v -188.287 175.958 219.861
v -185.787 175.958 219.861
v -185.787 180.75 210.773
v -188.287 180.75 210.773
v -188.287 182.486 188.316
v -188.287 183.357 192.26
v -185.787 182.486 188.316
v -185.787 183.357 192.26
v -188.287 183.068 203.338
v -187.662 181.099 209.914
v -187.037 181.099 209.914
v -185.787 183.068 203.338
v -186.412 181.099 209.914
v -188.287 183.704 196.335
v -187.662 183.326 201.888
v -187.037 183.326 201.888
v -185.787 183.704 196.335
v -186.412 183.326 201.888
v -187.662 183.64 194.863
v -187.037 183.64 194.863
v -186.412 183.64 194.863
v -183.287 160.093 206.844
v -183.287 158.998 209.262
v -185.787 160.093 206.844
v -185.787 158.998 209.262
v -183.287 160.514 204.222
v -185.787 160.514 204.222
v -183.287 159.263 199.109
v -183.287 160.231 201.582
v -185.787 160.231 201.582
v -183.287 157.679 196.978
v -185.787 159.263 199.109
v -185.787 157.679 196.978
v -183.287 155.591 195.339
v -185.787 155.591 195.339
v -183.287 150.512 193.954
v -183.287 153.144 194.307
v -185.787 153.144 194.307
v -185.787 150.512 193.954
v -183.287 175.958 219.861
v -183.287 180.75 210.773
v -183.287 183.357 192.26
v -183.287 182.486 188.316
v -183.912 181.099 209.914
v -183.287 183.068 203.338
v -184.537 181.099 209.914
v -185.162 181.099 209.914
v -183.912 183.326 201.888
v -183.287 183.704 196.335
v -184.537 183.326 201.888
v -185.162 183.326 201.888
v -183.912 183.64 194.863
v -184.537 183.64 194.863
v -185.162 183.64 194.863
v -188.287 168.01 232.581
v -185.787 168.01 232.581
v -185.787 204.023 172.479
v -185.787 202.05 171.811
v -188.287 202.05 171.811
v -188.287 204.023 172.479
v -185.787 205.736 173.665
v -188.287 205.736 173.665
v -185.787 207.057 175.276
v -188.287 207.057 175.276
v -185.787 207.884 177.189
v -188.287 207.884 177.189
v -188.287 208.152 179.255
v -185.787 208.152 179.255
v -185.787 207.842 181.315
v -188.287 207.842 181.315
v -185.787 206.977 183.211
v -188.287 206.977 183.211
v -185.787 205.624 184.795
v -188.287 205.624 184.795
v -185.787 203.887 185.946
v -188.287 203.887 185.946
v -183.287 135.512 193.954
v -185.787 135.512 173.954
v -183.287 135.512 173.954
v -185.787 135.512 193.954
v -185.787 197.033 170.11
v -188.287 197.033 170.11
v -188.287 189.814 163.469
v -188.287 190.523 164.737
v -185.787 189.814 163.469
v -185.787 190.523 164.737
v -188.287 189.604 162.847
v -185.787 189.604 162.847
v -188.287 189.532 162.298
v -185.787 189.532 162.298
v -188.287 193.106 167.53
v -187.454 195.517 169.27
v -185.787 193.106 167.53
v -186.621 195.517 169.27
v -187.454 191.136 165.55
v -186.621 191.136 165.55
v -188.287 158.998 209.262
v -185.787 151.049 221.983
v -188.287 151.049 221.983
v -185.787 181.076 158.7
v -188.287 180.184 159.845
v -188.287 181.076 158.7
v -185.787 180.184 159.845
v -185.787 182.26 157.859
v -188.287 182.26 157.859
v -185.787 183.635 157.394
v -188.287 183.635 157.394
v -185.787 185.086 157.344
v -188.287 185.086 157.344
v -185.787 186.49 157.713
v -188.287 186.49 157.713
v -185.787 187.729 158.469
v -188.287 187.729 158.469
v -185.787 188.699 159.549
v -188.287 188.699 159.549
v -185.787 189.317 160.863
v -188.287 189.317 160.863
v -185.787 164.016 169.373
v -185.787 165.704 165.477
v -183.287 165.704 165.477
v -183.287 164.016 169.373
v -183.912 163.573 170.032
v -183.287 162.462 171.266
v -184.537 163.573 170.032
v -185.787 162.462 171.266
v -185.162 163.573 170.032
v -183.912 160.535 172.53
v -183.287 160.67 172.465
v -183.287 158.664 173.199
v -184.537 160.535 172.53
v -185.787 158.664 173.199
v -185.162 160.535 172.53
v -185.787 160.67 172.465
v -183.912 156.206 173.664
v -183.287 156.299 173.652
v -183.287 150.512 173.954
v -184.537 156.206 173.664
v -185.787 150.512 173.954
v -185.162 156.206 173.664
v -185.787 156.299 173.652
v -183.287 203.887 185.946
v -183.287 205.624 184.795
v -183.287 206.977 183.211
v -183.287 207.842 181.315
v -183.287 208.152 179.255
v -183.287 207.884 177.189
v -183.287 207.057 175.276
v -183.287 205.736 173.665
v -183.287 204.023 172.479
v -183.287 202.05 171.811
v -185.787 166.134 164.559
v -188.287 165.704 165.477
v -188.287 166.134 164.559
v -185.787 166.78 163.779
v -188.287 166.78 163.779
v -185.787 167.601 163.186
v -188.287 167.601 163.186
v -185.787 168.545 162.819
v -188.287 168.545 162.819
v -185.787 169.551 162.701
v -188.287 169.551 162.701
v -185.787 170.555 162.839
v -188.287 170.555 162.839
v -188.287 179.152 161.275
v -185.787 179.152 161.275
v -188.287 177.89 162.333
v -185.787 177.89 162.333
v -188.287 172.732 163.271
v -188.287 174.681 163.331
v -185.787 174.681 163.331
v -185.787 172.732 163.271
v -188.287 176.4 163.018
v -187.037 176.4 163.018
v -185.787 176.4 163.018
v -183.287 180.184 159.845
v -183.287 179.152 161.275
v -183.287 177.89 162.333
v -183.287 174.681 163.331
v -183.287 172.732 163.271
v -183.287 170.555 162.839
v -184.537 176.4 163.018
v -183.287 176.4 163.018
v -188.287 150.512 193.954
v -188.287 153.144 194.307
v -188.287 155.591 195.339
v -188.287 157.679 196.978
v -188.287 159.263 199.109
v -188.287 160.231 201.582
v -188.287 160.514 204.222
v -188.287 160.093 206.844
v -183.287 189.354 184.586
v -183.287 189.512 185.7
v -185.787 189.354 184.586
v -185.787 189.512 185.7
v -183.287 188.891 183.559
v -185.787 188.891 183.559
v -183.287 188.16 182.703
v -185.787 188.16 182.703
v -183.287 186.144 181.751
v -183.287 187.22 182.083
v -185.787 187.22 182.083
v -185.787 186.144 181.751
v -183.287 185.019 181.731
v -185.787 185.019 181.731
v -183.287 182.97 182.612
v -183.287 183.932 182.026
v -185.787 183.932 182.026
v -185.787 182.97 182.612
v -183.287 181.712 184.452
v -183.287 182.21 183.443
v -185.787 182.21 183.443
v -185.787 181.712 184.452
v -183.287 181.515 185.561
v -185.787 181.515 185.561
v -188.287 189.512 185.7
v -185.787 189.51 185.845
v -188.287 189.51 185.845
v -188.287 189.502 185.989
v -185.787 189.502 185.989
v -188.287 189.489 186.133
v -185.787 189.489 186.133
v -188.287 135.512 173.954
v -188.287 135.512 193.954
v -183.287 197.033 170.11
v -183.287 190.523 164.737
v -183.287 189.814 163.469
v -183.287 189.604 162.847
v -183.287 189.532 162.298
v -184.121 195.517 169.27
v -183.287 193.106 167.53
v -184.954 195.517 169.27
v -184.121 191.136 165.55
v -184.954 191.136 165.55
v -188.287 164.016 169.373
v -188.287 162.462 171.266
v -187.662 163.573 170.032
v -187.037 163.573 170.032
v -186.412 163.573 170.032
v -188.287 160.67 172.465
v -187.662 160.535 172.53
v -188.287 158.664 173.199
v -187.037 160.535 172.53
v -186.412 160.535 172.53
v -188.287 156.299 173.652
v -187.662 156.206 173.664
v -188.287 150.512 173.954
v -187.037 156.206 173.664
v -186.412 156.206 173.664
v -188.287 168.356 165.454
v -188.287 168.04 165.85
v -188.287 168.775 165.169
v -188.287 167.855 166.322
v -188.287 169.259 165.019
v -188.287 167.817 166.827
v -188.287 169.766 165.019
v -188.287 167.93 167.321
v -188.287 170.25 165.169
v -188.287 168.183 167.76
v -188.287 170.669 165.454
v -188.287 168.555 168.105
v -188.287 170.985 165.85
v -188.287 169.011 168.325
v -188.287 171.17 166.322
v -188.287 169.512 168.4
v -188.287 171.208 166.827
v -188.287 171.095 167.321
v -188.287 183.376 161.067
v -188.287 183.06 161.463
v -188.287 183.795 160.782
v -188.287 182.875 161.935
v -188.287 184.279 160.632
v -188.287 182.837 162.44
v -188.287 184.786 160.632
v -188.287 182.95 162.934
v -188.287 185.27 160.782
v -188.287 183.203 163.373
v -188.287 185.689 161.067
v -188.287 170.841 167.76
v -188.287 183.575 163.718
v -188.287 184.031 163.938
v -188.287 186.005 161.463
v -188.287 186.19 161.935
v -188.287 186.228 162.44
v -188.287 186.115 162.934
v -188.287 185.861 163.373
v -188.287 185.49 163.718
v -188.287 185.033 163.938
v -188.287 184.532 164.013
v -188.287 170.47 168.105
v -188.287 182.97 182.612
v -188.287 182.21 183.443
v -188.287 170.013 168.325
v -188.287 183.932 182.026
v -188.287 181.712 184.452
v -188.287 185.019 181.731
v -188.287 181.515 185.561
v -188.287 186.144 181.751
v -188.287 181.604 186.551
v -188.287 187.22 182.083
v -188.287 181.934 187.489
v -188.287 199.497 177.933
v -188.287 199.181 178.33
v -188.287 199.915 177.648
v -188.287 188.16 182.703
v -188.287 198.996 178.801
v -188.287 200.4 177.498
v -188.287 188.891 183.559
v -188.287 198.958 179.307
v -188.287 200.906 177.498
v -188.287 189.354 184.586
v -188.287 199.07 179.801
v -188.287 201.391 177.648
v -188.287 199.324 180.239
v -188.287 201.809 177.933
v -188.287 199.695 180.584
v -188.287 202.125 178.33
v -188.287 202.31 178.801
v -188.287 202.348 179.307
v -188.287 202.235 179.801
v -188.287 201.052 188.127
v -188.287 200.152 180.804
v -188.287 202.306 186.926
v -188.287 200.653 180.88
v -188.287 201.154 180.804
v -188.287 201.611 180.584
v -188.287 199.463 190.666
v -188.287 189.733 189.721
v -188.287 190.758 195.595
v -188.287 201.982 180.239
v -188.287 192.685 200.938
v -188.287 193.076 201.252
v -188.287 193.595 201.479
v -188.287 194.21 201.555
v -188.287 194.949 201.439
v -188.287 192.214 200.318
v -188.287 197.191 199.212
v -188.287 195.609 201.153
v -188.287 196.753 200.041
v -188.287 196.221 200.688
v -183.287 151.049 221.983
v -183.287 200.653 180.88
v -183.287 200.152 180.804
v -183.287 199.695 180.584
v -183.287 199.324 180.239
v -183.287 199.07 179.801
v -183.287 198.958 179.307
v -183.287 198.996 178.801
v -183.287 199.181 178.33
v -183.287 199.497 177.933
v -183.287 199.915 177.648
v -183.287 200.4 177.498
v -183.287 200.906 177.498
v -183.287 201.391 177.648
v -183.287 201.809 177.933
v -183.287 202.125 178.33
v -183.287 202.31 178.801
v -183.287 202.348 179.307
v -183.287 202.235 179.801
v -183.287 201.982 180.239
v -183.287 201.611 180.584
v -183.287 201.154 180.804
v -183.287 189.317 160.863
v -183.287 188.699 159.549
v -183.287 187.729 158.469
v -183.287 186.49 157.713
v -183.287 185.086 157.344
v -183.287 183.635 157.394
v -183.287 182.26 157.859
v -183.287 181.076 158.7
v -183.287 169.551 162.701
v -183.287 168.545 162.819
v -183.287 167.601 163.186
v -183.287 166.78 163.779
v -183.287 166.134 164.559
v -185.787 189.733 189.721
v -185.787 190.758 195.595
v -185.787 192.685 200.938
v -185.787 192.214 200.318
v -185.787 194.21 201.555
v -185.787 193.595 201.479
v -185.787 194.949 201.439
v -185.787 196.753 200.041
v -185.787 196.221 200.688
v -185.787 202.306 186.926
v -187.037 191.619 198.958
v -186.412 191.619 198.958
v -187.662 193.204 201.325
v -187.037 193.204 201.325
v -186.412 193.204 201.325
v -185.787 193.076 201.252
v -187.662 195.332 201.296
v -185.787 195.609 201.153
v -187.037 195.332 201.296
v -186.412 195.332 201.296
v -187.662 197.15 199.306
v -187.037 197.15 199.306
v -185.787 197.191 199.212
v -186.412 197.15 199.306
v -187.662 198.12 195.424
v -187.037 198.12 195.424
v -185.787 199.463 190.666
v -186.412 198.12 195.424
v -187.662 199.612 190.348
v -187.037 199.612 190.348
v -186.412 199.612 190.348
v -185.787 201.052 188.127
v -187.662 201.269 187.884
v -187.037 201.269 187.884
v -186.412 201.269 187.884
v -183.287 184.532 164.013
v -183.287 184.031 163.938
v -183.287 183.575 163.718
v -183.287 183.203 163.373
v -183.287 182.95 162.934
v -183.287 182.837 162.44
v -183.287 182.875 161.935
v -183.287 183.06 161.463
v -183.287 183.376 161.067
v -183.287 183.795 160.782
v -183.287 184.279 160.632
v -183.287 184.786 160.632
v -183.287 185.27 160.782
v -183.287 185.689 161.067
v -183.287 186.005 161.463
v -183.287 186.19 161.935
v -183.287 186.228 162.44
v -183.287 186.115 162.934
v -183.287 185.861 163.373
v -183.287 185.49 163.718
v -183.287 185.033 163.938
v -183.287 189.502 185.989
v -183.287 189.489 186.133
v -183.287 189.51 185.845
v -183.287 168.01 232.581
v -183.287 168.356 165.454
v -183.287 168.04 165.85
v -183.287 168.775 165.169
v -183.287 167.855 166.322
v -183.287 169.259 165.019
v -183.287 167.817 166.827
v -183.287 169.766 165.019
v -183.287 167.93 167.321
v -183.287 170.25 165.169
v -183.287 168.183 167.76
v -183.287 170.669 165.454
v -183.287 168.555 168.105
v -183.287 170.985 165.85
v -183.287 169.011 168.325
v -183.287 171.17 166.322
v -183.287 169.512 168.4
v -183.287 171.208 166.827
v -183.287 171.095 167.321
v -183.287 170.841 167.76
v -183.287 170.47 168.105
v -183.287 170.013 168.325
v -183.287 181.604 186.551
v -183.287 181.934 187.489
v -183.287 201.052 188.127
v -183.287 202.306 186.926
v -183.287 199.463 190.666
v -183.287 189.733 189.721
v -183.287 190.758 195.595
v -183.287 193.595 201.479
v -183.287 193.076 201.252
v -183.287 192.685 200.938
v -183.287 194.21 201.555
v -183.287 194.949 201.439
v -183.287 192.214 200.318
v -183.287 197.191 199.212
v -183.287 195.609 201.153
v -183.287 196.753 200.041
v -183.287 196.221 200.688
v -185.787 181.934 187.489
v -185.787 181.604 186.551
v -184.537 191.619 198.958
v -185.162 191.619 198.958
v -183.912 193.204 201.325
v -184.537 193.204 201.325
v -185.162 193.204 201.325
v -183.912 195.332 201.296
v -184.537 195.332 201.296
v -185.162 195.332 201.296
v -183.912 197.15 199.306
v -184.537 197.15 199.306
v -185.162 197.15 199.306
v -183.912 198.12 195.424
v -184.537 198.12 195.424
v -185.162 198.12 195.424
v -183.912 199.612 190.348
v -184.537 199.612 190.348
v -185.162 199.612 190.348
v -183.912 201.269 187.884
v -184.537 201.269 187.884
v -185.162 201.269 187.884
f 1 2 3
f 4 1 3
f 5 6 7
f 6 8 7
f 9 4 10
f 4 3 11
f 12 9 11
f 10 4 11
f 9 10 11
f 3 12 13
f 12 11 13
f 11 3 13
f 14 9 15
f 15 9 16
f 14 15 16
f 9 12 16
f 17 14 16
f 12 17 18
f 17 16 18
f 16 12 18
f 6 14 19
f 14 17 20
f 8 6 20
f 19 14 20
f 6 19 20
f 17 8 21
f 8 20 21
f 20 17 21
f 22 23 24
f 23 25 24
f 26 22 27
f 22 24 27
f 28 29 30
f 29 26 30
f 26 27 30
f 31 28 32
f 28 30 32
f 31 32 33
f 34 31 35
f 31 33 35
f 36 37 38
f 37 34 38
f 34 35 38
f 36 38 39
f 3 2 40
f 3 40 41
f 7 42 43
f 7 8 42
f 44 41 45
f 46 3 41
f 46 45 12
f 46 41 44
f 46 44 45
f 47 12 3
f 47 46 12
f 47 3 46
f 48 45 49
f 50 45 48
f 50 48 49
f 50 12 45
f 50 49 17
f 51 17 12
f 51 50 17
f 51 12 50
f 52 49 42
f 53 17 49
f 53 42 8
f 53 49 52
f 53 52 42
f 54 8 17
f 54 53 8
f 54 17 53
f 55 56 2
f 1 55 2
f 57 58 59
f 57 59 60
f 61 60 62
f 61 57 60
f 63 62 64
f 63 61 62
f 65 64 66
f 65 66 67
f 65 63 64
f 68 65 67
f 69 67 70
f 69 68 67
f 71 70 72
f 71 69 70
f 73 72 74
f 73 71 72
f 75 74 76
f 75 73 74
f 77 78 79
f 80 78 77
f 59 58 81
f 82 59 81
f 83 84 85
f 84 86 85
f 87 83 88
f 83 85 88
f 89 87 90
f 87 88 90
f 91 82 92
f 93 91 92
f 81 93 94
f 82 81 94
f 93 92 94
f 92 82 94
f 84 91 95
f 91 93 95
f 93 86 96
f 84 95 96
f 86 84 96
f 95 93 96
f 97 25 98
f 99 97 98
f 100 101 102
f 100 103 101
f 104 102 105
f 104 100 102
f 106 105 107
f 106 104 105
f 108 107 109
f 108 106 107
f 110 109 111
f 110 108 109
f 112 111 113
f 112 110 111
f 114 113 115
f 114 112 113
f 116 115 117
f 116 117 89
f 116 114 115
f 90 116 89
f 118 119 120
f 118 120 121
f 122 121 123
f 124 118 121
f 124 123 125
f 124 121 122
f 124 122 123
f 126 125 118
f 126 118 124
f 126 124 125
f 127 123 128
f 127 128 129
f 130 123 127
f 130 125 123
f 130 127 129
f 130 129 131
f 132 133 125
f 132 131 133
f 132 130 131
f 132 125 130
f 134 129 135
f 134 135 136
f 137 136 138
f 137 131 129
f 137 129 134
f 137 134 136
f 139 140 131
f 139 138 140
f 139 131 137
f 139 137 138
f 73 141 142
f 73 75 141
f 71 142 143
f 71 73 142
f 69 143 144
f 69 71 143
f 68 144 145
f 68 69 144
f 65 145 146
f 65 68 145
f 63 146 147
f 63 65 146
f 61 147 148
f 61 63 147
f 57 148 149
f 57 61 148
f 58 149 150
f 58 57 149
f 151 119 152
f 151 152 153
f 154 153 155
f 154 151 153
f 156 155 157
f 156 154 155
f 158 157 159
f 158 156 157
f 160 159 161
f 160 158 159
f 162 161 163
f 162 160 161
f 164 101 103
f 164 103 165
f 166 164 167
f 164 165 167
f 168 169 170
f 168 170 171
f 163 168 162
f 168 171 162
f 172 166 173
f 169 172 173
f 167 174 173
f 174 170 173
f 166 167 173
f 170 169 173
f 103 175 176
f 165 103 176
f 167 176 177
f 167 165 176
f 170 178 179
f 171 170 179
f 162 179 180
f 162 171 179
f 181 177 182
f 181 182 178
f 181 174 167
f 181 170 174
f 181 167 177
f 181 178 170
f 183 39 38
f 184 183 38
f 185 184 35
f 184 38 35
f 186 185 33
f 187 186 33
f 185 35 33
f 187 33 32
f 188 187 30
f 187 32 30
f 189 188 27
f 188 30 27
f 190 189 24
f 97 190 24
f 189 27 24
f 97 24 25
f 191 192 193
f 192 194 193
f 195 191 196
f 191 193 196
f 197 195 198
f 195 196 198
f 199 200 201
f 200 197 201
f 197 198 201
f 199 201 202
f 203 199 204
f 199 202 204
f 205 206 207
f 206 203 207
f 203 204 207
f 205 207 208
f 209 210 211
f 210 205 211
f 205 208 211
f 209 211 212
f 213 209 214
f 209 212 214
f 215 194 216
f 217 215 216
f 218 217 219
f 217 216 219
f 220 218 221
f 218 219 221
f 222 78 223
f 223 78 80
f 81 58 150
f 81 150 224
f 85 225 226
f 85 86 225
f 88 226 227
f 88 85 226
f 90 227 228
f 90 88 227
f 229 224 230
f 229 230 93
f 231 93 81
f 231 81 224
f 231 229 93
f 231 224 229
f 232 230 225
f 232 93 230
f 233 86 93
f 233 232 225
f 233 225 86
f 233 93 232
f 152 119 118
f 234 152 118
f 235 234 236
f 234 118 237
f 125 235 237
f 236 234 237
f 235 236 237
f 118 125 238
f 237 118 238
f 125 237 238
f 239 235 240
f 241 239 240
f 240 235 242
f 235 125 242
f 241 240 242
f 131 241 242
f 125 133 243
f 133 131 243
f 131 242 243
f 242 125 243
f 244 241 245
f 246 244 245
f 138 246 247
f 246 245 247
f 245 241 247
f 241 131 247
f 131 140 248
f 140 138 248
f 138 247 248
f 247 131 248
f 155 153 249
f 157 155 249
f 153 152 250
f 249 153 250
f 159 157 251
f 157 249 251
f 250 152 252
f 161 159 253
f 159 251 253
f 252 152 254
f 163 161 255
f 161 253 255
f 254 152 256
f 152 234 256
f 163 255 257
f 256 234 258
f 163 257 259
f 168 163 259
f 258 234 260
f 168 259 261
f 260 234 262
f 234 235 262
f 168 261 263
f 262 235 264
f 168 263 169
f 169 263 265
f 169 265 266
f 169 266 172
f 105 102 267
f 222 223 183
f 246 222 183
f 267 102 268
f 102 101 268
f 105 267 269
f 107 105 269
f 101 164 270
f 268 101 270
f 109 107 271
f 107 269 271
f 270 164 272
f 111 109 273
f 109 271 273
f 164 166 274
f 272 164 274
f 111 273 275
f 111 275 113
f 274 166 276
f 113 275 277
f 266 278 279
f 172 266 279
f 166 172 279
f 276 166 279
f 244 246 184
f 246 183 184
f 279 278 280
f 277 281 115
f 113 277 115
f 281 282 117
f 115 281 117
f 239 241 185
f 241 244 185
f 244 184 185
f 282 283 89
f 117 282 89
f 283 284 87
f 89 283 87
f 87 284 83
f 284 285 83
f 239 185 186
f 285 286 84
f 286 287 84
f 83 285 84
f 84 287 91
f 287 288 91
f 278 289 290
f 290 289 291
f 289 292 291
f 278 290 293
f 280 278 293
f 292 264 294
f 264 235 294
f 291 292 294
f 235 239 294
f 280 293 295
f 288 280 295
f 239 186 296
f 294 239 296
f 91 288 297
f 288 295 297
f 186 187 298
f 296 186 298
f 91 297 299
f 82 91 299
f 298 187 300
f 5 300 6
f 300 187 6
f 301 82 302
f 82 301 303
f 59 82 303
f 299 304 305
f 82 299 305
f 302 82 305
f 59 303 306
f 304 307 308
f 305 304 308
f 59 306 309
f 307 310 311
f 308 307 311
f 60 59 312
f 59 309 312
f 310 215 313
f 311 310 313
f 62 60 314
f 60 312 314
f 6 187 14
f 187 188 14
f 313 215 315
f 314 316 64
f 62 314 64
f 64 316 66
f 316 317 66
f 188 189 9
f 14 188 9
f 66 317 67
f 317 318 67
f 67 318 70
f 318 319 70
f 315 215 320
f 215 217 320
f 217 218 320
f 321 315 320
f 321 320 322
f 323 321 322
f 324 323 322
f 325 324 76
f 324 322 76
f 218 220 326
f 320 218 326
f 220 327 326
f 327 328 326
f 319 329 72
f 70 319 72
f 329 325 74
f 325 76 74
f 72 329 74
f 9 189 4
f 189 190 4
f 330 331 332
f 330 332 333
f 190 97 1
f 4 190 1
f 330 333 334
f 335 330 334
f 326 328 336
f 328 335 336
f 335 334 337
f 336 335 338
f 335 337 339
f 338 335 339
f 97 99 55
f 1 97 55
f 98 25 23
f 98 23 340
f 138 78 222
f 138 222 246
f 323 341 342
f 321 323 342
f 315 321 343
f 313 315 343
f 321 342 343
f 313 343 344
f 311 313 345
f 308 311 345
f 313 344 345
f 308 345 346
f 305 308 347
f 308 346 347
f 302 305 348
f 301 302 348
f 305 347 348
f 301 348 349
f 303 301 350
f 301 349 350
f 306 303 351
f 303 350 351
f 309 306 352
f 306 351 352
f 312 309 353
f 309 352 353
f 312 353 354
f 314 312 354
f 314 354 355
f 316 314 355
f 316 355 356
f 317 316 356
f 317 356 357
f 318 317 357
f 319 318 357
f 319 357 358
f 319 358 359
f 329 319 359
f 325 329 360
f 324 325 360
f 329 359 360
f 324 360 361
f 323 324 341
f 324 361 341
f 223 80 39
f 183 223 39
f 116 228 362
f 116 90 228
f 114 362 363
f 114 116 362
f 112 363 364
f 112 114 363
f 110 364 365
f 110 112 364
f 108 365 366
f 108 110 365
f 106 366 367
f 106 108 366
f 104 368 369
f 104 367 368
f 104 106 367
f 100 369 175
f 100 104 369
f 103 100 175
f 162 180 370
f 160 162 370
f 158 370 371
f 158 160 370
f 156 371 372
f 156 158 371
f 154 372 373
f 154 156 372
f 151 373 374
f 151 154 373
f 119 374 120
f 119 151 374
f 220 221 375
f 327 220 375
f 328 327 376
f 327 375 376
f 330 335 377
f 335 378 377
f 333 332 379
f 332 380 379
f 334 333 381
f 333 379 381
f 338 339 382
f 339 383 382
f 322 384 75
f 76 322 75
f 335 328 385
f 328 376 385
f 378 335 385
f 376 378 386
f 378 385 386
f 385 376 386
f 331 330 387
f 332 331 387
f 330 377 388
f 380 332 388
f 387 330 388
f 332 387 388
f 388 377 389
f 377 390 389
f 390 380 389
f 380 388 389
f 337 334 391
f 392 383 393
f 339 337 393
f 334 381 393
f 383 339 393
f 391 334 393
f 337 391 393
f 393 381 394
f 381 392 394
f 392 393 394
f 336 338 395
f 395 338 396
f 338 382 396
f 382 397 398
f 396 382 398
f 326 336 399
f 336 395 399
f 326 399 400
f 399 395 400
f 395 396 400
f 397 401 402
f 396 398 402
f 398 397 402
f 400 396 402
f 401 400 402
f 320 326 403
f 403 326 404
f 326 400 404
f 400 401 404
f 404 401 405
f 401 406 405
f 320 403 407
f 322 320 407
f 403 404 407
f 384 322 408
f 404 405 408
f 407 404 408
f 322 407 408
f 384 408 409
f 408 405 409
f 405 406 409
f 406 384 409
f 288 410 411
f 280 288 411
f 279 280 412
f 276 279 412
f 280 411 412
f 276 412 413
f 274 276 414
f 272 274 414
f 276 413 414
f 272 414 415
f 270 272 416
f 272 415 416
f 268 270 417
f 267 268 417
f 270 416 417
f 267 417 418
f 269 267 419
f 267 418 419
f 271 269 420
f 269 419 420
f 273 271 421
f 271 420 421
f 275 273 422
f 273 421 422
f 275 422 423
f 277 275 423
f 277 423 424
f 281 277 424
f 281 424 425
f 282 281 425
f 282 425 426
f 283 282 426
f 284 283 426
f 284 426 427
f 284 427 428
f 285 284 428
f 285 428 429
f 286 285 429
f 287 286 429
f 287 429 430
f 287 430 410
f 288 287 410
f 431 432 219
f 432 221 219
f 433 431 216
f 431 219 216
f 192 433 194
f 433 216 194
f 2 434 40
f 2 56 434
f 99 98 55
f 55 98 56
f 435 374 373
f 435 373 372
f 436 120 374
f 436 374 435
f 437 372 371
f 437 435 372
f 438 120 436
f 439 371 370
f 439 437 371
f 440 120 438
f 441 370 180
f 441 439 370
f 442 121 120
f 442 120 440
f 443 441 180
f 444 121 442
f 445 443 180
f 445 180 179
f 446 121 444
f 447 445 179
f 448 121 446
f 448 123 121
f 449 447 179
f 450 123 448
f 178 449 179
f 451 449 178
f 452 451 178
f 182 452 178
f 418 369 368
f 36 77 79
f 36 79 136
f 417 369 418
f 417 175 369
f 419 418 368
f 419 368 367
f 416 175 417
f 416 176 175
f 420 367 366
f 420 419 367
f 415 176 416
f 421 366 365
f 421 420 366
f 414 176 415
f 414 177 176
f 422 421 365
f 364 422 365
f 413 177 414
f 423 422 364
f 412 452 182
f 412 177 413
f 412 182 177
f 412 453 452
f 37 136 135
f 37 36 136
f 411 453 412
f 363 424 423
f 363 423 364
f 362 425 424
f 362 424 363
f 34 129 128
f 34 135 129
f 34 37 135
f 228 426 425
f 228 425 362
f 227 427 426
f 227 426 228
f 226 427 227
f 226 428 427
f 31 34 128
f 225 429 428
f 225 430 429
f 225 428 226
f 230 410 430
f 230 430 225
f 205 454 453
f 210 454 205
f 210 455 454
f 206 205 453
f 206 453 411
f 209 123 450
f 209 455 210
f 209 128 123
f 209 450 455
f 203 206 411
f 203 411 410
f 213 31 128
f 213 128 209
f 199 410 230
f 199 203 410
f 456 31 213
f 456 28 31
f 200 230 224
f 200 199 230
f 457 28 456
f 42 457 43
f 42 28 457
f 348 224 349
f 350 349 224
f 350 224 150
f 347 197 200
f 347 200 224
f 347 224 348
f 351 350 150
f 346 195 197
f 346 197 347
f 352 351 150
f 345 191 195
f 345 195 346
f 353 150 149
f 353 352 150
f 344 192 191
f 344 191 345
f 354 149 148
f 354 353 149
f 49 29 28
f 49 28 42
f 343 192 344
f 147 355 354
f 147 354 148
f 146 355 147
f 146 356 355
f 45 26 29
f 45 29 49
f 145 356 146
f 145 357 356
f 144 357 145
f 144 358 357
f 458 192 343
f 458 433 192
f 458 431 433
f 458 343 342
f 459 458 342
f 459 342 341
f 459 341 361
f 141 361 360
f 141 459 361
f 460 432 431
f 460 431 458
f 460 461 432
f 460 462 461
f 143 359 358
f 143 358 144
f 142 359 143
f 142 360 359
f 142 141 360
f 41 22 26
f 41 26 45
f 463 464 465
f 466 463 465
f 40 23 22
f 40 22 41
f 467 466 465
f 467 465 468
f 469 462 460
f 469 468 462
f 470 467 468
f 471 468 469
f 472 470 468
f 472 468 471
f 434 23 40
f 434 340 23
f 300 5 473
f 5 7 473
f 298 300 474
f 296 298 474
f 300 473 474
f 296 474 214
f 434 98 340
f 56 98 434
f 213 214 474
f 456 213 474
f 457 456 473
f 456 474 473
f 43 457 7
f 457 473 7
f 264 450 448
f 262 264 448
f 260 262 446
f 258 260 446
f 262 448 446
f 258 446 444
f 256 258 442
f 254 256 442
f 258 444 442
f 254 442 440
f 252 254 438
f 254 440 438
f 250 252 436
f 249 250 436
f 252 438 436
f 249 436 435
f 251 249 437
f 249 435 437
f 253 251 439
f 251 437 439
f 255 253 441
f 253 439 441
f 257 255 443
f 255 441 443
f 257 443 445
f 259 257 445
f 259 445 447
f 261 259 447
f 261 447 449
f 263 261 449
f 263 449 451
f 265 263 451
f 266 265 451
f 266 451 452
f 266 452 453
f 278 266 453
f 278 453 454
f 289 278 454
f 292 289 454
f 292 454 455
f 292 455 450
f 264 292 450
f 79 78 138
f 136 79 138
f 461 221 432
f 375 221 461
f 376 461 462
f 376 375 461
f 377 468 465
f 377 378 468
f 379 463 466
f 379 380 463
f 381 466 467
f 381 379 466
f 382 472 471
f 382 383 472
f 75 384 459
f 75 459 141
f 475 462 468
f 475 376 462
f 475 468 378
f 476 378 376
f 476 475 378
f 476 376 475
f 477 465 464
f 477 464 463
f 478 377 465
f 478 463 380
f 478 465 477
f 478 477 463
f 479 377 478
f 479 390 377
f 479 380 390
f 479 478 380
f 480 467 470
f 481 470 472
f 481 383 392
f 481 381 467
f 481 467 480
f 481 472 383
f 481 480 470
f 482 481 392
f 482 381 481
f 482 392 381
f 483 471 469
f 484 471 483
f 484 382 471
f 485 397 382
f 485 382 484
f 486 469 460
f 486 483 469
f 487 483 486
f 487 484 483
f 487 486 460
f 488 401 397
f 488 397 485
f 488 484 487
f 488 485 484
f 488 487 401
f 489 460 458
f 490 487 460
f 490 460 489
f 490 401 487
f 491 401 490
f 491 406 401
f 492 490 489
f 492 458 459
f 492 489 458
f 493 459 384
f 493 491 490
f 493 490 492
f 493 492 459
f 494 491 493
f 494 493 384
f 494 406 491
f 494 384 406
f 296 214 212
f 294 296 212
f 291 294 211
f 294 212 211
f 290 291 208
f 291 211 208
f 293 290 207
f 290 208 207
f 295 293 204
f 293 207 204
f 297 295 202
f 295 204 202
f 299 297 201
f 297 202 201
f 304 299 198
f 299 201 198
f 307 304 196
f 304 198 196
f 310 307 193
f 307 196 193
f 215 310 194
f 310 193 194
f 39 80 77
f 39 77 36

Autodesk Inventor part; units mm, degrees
ref_plane "YZ Plane" through (0, 0, 0) normal (1, 0, 0) x (0, 1, 0)
ref_plane "XZ Plane" through (0, 0, 0) normal (0, 1, 0) x (-1, 0, 0)
ref_plane "XY Plane" through (0, 0, 0) normal (0, 0, 1) x (1, 0, 0)
ref_plane "Plano de trabajo1" through (-185.7873, -389.4877, 168.7004) normal (1, 0, 0) x (0, 1, 0)
sketch "Boceto1" plane through (-185.7873, -389.4877, 168.7004) normal (1, 0, 0) x (0, 1, 0)
  spline S0 degree 3 poles (534.733, 23.2998) (534.7105, 23.7942) (534.6906, 24.2218) (534.6565, 24.9274) (534.6425, 25.2033) (534.6129, 25.7399) (534.6044, 25.8219) (534.6094, 25.4554) (534.6229, 25.0104) (534.6701, 23.6469) (534.7034, 22.7415) (534.7857, 20.5852) (534.8338, 19.3549) (534.9389, 16.7287) (534.9948, 15.3579) (535.1069, 12.6551) (535.1621, 11.3489) (535.2644, 8.9741) (535.3106, 7.9282) (535.3879, 6.2371) (535.4183, 5.608) (535.4589, 4.8538) (535.4688, 4.7358) (535.4667, 5.0314) (535.4548, 5.4422) (535.4103, 6.7433) (535.3782, 7.6213) (535.2979, 9.7332) (535.2505, 10.9469) (535.1465, 13.5533) (535.0909, 14.9211) (534.9787, 17.6317) (534.9233, 18.9486) (534.8197, 21.3576) (534.7727, 22.4265) (534.733, 23.2998) knots -6.594944 -6.594944 -6.594944 -6.594944 -6.363484 -6.363484 -6.132024 -6.132024 -5.723223 -5.723223 -5.314421 -5.314421 -4.90562 -4.90562 -4.496818 -4.496818 -4.088016 -4.088016 -3.679215 -3.679215 -3.270413 -3.270413 -2.861611 -2.861611 -2.45281 -2.45281 -2.044008 -2.044008 -1.635207 -1.635207 -1.226405 -1.226405 -0.817603 -0.817603 -0.408802 -0.408802 0 0 0 0 construction
  spline S1 degree 3 poles (563.9582, 57.2503) (564.369, 57.506) (564.6982, 57.7109) (565.1814, 58.0114) (565.334, 58.1062) (565.502, 58.21) (565.3211, 58.0968) (564.4035, 57.5239) (563.6756, 57.0698) (561.7633, 55.8774) (560.5973, 55.1504) (557.9767, 53.5169) (556.5472, 52.6259) (553.6106, 50.7959) (552.1317, 49.8744) (549.319, 48.122) (548.0121, 47.3078) (545.7443, 45.8954) (544.8051, 45.3106) (543.4219, 44.4496) (542.9911, 44.1816) (542.6995, 44.001) (542.8416, 44.0901) (543.6854, 44.617) (544.379, 45.0497) (546.2318, 46.2051) (547.3731, 46.9167) (549.9574, 48.5276) (551.3756, 49.4116) (554.3045, 51.2368) (555.7872, 52.1607) (558.622, 53.9269) (559.9471, 54.7524) (562.2635, 56.1952) (563.2327, 56.7987) (563.9582, 57.2503) knots -8.403752 -8.403752 -8.403752 -8.403752 -8.108809 -8.108809 -7.813866 -7.813866 -7.292942 -7.292942 -6.772017 -6.772017 -6.251093 -6.251093 -5.730168 -5.730168 -5.209244 -5.209244 -4.68832 -4.68832 -4.167395 -4.167395 -3.646471 -3.646471 -3.125546 -3.125546 -2.604622 -2.604622 -2.083698 -2.083698 -1.562773 -1.562773 -1.041849 -1.041849 -0.520924 -0.520924 0 0 0 0 construction
  spline S2 degree 3 poles (534.6356, 25.8056) (534.6632, 25.2036) (534.6939, 24.5175) (534.7607, 23.0024) (534.7966, 22.178) (534.9005, 19.7543) (534.9715, 18.0684) (535.1144, 14.6095) (535.185, 12.8696) (535.3167, 9.5648) (535.3764, 8.0315) (535.4771, 5.3755) (535.517, 4.2783) (535.5717, 2.669) (535.5858, 2.1723) (535.5862, 1.8506) (535.5724, 2.0287) (535.5185, 3.0427) (535.4789, 3.869) (535.3787, 6.0669) (535.3192, 7.4176) (535.1878, 10.4704) (535.1173, 12.1433) (534.9744, 15.5937) (534.9034, 17.3383) (534.7703, 20.6697) (534.7095, 22.2248) (534.6062, 24.9384) (534.5647, 26.071) (534.5067, 27.7605) (534.4907, 28.3011) (534.4865, 28.7134) (534.4984, 28.5811) (534.5489, 27.6545) (534.5869, 26.869) (534.6356, 25.8056) knots -8.403752 -8.403752 -8.403752 -8.403752 -8.108809 -8.108809 -7.813866 -7.813866 -7.292942 -7.292942 -6.772017 -6.772017 -6.251093 -6.251093 -5.730168 -5.730168 -5.209244 -5.209244 -4.68832 -4.68832 -4.167395 -4.167395 -3.646471 -3.646471 -3.125546 -3.125546 -2.604622 -2.604622 -2.083698 -2.083698 -1.562773 -1.562773 -1.041849 -1.041849 -0.520924 -0.520924 0 0 0 0 construction
  line L0 (525, 5.254) -> (525, 25.254)
  line L1 (525, 25.254) -> (540, 25.254)
  arc A0 (540, 25.254) -> (548.4852, 40.5618) centre (540, 35.2596) ccw
  line L2 (548.4852, 40.5618) -> (540.5364, 53.2825)
  line L3 (540.5364, 53.2825) -> (557.4974, 63.8809)
  line L4 (557.4974, 63.8809) -> (565.4462, 51.1602)
  line L5 (525, 15.254) -> (575, 17.0001) construction
  line L6 (549.0169, 58.5817) -> (575, 17.0001) construction
  line L7 (525, 5.254) -> (540, 5.254)
  circle A1 centre (575, 17.0001) radius 4 construction
  line L8 (565.4462, 51.1602) -> (573.2852, 38.6152) construction
  line L9 (573.8755, 23.7788) -> (571.0024, 16.8605) construction
  spline S3 degree 4 poles (565.4462, 51.1602) (573.2852, 38.6152) (573.8755, 31.3158) (573.8755, 23.7788) (571.0024, 16.8605) knots 1 1 1 1 1 2 2 2 2 2
  circle A2 centre (575, 17.0001) radius 4
  line L10 (578.9765, 17.4327) -> (578.7688, 19.3424) construction
  line L11 (578.7688, 19.3424) -> (580.8115, 30.4088) construction
  line L12 (580.8115, 30.4088) -> (581.5561, 33.9943) construction
  line L13 (581.5561, 33.9943) -> (588.3082, 32.4831) construction
  line L14 (588.3082, 32.4831) -> (587.0334, 24.49) construction
  line L15 (587.0334, 24.49) -> (590.1956, 18.7656) construction
  line L16 (546.3222, 5.254) -> (540, 5.254) construction
  line L17 (573.2852, 38.6152) -> (573.8755, 31.3158) construction
  line L18 (573.8755, 31.3158) -> (573.8755, 23.7788) construction
  arc A3 (591.5375, 3.1103) -> (593.375, 17.2458) centre (590.1405, 10.4791) ccw
  arc A4 (569.6718, -8.8556) -> (579.02, -6.402) centre (574.02, -6.3872) ccw
  arc A5 (555.1918, -3.2238) -> (560.0425, -5.8618) centre (559, -2) ccw
  spline S4 degree 4 poles (578.9765, 17.4327) (578.7688, 19.3424) (580.8115, 30.4088) (581.5561, 33.9943) (588.3082, 32.4831) (587.0334, 24.49) (590.1956, 18.7656) (593.375, 17.2458) knots 0 0 0 0 0 1 2 3 4 4 4 4 4
  line L19 (590.1956, 18.7656) -> (593.375, 17.2458) construction
  spline S5 degree 4 poles (555.1918, -3.2238) (553.3097, 2.6327) (551.1077, 4.616) (546.3222, 5.254) (540, 5.254) knots 21.570729 21.570729 21.570729 21.570729 21.570729 22 22 22 22 22
  line L20 (555.1918, -3.2238) -> (553.3097, 2.6327) construction
  line L21 (553.3097, 2.6327) -> (551.1077, 4.616) construction
  line L22 (551.1077, 4.616) -> (546.3222, 5.254) construction
  line L23 (569.6718, -8.8556) -> (566.9184, -4.0055) construction
  line L24 (566.9184, -4.0055) -> (560.0425, -5.8618) construction
  spline S6 degree 2 poles (569.6718, -8.8556) (566.9184, -4.0055) (560.0425, -5.8618) knots 1 1 1 2 2 2
  line L25 (575, 17.0001) -> (528.8996, 17.0001) construction
  line L26 (591.5375, 3.1103) -> (584.136, 1.7072) construction
  line L27 (584.136, 1.7072) -> (579.0273, -3.9321) construction
  line L28 (579.0273, -3.9321) -> (579.02, -6.402) construction
  spline S7 degree 3 poles (591.5375, 3.1103) (584.136, 1.7072) (579.0273, -3.9321) (579.02, -6.402) knots 1 1 1 1 2 2 2 2
  point P0 (389.4877, -168.7004)
  point P1 (534.733, 23.2998)
  point P2 (563.9582, 57.2503)
  point P3 (534.6356, 25.8056)
  point P4 (571.974, 19.6161)
  point P5 (578.9765, 17.4332)
  point P6 (571.0024, 16.8605)
  dimension "d78" = 8
  dimension "d75" = 20
  dimension "d76" = 60
  dimension "d77" = 15
  dimension "d232" = 15
  dimension "d233" = 10
  dimension "d234" = 8
  dimension "d290" = 2
  dimension "d291" = 50
extrude "Extrusión1" add sketch "Boceto1" along normal mid plane 5 contours L0 L1 A0 L2 L3 L4 S3 A2 S4 A3 S7 A4 S6 A5 S5 L7
sketch "Boceto2" plane through (-188.2873, -389.4877, 168.7004) normal (-1, 0, 0) x (0, 0, 1)
  arc A0 (-5.8618, 560.0425) -> (-3.2238, 555.1918) centre (-2, 559) ccw projected
  arc A1 (-6.402, 579.02) -> (-8.8556, 569.6718) centre (-6.3872, 574.02) ccw projected
  arc A2 (17.2458, 593.375) -> (3.1103, 591.5375) centre (10.4791, 590.1405) ccw projected
  point P0 (-168.7004, 389.4877)
hole "Agujero1" at (-188.2873, 169.5123, 166.7004) at (-188.2873, 184.5323, 162.3132) at (-188.2873, 200.6529, 179.1795) direction (1, 0, 0) diameter 3.4 end through all clearance for "Tornillo para maquinaria de cabeza plana" size "M3" standard "Perfil M métrico ANSI"
properties part number "soporte_eje_trasero"
